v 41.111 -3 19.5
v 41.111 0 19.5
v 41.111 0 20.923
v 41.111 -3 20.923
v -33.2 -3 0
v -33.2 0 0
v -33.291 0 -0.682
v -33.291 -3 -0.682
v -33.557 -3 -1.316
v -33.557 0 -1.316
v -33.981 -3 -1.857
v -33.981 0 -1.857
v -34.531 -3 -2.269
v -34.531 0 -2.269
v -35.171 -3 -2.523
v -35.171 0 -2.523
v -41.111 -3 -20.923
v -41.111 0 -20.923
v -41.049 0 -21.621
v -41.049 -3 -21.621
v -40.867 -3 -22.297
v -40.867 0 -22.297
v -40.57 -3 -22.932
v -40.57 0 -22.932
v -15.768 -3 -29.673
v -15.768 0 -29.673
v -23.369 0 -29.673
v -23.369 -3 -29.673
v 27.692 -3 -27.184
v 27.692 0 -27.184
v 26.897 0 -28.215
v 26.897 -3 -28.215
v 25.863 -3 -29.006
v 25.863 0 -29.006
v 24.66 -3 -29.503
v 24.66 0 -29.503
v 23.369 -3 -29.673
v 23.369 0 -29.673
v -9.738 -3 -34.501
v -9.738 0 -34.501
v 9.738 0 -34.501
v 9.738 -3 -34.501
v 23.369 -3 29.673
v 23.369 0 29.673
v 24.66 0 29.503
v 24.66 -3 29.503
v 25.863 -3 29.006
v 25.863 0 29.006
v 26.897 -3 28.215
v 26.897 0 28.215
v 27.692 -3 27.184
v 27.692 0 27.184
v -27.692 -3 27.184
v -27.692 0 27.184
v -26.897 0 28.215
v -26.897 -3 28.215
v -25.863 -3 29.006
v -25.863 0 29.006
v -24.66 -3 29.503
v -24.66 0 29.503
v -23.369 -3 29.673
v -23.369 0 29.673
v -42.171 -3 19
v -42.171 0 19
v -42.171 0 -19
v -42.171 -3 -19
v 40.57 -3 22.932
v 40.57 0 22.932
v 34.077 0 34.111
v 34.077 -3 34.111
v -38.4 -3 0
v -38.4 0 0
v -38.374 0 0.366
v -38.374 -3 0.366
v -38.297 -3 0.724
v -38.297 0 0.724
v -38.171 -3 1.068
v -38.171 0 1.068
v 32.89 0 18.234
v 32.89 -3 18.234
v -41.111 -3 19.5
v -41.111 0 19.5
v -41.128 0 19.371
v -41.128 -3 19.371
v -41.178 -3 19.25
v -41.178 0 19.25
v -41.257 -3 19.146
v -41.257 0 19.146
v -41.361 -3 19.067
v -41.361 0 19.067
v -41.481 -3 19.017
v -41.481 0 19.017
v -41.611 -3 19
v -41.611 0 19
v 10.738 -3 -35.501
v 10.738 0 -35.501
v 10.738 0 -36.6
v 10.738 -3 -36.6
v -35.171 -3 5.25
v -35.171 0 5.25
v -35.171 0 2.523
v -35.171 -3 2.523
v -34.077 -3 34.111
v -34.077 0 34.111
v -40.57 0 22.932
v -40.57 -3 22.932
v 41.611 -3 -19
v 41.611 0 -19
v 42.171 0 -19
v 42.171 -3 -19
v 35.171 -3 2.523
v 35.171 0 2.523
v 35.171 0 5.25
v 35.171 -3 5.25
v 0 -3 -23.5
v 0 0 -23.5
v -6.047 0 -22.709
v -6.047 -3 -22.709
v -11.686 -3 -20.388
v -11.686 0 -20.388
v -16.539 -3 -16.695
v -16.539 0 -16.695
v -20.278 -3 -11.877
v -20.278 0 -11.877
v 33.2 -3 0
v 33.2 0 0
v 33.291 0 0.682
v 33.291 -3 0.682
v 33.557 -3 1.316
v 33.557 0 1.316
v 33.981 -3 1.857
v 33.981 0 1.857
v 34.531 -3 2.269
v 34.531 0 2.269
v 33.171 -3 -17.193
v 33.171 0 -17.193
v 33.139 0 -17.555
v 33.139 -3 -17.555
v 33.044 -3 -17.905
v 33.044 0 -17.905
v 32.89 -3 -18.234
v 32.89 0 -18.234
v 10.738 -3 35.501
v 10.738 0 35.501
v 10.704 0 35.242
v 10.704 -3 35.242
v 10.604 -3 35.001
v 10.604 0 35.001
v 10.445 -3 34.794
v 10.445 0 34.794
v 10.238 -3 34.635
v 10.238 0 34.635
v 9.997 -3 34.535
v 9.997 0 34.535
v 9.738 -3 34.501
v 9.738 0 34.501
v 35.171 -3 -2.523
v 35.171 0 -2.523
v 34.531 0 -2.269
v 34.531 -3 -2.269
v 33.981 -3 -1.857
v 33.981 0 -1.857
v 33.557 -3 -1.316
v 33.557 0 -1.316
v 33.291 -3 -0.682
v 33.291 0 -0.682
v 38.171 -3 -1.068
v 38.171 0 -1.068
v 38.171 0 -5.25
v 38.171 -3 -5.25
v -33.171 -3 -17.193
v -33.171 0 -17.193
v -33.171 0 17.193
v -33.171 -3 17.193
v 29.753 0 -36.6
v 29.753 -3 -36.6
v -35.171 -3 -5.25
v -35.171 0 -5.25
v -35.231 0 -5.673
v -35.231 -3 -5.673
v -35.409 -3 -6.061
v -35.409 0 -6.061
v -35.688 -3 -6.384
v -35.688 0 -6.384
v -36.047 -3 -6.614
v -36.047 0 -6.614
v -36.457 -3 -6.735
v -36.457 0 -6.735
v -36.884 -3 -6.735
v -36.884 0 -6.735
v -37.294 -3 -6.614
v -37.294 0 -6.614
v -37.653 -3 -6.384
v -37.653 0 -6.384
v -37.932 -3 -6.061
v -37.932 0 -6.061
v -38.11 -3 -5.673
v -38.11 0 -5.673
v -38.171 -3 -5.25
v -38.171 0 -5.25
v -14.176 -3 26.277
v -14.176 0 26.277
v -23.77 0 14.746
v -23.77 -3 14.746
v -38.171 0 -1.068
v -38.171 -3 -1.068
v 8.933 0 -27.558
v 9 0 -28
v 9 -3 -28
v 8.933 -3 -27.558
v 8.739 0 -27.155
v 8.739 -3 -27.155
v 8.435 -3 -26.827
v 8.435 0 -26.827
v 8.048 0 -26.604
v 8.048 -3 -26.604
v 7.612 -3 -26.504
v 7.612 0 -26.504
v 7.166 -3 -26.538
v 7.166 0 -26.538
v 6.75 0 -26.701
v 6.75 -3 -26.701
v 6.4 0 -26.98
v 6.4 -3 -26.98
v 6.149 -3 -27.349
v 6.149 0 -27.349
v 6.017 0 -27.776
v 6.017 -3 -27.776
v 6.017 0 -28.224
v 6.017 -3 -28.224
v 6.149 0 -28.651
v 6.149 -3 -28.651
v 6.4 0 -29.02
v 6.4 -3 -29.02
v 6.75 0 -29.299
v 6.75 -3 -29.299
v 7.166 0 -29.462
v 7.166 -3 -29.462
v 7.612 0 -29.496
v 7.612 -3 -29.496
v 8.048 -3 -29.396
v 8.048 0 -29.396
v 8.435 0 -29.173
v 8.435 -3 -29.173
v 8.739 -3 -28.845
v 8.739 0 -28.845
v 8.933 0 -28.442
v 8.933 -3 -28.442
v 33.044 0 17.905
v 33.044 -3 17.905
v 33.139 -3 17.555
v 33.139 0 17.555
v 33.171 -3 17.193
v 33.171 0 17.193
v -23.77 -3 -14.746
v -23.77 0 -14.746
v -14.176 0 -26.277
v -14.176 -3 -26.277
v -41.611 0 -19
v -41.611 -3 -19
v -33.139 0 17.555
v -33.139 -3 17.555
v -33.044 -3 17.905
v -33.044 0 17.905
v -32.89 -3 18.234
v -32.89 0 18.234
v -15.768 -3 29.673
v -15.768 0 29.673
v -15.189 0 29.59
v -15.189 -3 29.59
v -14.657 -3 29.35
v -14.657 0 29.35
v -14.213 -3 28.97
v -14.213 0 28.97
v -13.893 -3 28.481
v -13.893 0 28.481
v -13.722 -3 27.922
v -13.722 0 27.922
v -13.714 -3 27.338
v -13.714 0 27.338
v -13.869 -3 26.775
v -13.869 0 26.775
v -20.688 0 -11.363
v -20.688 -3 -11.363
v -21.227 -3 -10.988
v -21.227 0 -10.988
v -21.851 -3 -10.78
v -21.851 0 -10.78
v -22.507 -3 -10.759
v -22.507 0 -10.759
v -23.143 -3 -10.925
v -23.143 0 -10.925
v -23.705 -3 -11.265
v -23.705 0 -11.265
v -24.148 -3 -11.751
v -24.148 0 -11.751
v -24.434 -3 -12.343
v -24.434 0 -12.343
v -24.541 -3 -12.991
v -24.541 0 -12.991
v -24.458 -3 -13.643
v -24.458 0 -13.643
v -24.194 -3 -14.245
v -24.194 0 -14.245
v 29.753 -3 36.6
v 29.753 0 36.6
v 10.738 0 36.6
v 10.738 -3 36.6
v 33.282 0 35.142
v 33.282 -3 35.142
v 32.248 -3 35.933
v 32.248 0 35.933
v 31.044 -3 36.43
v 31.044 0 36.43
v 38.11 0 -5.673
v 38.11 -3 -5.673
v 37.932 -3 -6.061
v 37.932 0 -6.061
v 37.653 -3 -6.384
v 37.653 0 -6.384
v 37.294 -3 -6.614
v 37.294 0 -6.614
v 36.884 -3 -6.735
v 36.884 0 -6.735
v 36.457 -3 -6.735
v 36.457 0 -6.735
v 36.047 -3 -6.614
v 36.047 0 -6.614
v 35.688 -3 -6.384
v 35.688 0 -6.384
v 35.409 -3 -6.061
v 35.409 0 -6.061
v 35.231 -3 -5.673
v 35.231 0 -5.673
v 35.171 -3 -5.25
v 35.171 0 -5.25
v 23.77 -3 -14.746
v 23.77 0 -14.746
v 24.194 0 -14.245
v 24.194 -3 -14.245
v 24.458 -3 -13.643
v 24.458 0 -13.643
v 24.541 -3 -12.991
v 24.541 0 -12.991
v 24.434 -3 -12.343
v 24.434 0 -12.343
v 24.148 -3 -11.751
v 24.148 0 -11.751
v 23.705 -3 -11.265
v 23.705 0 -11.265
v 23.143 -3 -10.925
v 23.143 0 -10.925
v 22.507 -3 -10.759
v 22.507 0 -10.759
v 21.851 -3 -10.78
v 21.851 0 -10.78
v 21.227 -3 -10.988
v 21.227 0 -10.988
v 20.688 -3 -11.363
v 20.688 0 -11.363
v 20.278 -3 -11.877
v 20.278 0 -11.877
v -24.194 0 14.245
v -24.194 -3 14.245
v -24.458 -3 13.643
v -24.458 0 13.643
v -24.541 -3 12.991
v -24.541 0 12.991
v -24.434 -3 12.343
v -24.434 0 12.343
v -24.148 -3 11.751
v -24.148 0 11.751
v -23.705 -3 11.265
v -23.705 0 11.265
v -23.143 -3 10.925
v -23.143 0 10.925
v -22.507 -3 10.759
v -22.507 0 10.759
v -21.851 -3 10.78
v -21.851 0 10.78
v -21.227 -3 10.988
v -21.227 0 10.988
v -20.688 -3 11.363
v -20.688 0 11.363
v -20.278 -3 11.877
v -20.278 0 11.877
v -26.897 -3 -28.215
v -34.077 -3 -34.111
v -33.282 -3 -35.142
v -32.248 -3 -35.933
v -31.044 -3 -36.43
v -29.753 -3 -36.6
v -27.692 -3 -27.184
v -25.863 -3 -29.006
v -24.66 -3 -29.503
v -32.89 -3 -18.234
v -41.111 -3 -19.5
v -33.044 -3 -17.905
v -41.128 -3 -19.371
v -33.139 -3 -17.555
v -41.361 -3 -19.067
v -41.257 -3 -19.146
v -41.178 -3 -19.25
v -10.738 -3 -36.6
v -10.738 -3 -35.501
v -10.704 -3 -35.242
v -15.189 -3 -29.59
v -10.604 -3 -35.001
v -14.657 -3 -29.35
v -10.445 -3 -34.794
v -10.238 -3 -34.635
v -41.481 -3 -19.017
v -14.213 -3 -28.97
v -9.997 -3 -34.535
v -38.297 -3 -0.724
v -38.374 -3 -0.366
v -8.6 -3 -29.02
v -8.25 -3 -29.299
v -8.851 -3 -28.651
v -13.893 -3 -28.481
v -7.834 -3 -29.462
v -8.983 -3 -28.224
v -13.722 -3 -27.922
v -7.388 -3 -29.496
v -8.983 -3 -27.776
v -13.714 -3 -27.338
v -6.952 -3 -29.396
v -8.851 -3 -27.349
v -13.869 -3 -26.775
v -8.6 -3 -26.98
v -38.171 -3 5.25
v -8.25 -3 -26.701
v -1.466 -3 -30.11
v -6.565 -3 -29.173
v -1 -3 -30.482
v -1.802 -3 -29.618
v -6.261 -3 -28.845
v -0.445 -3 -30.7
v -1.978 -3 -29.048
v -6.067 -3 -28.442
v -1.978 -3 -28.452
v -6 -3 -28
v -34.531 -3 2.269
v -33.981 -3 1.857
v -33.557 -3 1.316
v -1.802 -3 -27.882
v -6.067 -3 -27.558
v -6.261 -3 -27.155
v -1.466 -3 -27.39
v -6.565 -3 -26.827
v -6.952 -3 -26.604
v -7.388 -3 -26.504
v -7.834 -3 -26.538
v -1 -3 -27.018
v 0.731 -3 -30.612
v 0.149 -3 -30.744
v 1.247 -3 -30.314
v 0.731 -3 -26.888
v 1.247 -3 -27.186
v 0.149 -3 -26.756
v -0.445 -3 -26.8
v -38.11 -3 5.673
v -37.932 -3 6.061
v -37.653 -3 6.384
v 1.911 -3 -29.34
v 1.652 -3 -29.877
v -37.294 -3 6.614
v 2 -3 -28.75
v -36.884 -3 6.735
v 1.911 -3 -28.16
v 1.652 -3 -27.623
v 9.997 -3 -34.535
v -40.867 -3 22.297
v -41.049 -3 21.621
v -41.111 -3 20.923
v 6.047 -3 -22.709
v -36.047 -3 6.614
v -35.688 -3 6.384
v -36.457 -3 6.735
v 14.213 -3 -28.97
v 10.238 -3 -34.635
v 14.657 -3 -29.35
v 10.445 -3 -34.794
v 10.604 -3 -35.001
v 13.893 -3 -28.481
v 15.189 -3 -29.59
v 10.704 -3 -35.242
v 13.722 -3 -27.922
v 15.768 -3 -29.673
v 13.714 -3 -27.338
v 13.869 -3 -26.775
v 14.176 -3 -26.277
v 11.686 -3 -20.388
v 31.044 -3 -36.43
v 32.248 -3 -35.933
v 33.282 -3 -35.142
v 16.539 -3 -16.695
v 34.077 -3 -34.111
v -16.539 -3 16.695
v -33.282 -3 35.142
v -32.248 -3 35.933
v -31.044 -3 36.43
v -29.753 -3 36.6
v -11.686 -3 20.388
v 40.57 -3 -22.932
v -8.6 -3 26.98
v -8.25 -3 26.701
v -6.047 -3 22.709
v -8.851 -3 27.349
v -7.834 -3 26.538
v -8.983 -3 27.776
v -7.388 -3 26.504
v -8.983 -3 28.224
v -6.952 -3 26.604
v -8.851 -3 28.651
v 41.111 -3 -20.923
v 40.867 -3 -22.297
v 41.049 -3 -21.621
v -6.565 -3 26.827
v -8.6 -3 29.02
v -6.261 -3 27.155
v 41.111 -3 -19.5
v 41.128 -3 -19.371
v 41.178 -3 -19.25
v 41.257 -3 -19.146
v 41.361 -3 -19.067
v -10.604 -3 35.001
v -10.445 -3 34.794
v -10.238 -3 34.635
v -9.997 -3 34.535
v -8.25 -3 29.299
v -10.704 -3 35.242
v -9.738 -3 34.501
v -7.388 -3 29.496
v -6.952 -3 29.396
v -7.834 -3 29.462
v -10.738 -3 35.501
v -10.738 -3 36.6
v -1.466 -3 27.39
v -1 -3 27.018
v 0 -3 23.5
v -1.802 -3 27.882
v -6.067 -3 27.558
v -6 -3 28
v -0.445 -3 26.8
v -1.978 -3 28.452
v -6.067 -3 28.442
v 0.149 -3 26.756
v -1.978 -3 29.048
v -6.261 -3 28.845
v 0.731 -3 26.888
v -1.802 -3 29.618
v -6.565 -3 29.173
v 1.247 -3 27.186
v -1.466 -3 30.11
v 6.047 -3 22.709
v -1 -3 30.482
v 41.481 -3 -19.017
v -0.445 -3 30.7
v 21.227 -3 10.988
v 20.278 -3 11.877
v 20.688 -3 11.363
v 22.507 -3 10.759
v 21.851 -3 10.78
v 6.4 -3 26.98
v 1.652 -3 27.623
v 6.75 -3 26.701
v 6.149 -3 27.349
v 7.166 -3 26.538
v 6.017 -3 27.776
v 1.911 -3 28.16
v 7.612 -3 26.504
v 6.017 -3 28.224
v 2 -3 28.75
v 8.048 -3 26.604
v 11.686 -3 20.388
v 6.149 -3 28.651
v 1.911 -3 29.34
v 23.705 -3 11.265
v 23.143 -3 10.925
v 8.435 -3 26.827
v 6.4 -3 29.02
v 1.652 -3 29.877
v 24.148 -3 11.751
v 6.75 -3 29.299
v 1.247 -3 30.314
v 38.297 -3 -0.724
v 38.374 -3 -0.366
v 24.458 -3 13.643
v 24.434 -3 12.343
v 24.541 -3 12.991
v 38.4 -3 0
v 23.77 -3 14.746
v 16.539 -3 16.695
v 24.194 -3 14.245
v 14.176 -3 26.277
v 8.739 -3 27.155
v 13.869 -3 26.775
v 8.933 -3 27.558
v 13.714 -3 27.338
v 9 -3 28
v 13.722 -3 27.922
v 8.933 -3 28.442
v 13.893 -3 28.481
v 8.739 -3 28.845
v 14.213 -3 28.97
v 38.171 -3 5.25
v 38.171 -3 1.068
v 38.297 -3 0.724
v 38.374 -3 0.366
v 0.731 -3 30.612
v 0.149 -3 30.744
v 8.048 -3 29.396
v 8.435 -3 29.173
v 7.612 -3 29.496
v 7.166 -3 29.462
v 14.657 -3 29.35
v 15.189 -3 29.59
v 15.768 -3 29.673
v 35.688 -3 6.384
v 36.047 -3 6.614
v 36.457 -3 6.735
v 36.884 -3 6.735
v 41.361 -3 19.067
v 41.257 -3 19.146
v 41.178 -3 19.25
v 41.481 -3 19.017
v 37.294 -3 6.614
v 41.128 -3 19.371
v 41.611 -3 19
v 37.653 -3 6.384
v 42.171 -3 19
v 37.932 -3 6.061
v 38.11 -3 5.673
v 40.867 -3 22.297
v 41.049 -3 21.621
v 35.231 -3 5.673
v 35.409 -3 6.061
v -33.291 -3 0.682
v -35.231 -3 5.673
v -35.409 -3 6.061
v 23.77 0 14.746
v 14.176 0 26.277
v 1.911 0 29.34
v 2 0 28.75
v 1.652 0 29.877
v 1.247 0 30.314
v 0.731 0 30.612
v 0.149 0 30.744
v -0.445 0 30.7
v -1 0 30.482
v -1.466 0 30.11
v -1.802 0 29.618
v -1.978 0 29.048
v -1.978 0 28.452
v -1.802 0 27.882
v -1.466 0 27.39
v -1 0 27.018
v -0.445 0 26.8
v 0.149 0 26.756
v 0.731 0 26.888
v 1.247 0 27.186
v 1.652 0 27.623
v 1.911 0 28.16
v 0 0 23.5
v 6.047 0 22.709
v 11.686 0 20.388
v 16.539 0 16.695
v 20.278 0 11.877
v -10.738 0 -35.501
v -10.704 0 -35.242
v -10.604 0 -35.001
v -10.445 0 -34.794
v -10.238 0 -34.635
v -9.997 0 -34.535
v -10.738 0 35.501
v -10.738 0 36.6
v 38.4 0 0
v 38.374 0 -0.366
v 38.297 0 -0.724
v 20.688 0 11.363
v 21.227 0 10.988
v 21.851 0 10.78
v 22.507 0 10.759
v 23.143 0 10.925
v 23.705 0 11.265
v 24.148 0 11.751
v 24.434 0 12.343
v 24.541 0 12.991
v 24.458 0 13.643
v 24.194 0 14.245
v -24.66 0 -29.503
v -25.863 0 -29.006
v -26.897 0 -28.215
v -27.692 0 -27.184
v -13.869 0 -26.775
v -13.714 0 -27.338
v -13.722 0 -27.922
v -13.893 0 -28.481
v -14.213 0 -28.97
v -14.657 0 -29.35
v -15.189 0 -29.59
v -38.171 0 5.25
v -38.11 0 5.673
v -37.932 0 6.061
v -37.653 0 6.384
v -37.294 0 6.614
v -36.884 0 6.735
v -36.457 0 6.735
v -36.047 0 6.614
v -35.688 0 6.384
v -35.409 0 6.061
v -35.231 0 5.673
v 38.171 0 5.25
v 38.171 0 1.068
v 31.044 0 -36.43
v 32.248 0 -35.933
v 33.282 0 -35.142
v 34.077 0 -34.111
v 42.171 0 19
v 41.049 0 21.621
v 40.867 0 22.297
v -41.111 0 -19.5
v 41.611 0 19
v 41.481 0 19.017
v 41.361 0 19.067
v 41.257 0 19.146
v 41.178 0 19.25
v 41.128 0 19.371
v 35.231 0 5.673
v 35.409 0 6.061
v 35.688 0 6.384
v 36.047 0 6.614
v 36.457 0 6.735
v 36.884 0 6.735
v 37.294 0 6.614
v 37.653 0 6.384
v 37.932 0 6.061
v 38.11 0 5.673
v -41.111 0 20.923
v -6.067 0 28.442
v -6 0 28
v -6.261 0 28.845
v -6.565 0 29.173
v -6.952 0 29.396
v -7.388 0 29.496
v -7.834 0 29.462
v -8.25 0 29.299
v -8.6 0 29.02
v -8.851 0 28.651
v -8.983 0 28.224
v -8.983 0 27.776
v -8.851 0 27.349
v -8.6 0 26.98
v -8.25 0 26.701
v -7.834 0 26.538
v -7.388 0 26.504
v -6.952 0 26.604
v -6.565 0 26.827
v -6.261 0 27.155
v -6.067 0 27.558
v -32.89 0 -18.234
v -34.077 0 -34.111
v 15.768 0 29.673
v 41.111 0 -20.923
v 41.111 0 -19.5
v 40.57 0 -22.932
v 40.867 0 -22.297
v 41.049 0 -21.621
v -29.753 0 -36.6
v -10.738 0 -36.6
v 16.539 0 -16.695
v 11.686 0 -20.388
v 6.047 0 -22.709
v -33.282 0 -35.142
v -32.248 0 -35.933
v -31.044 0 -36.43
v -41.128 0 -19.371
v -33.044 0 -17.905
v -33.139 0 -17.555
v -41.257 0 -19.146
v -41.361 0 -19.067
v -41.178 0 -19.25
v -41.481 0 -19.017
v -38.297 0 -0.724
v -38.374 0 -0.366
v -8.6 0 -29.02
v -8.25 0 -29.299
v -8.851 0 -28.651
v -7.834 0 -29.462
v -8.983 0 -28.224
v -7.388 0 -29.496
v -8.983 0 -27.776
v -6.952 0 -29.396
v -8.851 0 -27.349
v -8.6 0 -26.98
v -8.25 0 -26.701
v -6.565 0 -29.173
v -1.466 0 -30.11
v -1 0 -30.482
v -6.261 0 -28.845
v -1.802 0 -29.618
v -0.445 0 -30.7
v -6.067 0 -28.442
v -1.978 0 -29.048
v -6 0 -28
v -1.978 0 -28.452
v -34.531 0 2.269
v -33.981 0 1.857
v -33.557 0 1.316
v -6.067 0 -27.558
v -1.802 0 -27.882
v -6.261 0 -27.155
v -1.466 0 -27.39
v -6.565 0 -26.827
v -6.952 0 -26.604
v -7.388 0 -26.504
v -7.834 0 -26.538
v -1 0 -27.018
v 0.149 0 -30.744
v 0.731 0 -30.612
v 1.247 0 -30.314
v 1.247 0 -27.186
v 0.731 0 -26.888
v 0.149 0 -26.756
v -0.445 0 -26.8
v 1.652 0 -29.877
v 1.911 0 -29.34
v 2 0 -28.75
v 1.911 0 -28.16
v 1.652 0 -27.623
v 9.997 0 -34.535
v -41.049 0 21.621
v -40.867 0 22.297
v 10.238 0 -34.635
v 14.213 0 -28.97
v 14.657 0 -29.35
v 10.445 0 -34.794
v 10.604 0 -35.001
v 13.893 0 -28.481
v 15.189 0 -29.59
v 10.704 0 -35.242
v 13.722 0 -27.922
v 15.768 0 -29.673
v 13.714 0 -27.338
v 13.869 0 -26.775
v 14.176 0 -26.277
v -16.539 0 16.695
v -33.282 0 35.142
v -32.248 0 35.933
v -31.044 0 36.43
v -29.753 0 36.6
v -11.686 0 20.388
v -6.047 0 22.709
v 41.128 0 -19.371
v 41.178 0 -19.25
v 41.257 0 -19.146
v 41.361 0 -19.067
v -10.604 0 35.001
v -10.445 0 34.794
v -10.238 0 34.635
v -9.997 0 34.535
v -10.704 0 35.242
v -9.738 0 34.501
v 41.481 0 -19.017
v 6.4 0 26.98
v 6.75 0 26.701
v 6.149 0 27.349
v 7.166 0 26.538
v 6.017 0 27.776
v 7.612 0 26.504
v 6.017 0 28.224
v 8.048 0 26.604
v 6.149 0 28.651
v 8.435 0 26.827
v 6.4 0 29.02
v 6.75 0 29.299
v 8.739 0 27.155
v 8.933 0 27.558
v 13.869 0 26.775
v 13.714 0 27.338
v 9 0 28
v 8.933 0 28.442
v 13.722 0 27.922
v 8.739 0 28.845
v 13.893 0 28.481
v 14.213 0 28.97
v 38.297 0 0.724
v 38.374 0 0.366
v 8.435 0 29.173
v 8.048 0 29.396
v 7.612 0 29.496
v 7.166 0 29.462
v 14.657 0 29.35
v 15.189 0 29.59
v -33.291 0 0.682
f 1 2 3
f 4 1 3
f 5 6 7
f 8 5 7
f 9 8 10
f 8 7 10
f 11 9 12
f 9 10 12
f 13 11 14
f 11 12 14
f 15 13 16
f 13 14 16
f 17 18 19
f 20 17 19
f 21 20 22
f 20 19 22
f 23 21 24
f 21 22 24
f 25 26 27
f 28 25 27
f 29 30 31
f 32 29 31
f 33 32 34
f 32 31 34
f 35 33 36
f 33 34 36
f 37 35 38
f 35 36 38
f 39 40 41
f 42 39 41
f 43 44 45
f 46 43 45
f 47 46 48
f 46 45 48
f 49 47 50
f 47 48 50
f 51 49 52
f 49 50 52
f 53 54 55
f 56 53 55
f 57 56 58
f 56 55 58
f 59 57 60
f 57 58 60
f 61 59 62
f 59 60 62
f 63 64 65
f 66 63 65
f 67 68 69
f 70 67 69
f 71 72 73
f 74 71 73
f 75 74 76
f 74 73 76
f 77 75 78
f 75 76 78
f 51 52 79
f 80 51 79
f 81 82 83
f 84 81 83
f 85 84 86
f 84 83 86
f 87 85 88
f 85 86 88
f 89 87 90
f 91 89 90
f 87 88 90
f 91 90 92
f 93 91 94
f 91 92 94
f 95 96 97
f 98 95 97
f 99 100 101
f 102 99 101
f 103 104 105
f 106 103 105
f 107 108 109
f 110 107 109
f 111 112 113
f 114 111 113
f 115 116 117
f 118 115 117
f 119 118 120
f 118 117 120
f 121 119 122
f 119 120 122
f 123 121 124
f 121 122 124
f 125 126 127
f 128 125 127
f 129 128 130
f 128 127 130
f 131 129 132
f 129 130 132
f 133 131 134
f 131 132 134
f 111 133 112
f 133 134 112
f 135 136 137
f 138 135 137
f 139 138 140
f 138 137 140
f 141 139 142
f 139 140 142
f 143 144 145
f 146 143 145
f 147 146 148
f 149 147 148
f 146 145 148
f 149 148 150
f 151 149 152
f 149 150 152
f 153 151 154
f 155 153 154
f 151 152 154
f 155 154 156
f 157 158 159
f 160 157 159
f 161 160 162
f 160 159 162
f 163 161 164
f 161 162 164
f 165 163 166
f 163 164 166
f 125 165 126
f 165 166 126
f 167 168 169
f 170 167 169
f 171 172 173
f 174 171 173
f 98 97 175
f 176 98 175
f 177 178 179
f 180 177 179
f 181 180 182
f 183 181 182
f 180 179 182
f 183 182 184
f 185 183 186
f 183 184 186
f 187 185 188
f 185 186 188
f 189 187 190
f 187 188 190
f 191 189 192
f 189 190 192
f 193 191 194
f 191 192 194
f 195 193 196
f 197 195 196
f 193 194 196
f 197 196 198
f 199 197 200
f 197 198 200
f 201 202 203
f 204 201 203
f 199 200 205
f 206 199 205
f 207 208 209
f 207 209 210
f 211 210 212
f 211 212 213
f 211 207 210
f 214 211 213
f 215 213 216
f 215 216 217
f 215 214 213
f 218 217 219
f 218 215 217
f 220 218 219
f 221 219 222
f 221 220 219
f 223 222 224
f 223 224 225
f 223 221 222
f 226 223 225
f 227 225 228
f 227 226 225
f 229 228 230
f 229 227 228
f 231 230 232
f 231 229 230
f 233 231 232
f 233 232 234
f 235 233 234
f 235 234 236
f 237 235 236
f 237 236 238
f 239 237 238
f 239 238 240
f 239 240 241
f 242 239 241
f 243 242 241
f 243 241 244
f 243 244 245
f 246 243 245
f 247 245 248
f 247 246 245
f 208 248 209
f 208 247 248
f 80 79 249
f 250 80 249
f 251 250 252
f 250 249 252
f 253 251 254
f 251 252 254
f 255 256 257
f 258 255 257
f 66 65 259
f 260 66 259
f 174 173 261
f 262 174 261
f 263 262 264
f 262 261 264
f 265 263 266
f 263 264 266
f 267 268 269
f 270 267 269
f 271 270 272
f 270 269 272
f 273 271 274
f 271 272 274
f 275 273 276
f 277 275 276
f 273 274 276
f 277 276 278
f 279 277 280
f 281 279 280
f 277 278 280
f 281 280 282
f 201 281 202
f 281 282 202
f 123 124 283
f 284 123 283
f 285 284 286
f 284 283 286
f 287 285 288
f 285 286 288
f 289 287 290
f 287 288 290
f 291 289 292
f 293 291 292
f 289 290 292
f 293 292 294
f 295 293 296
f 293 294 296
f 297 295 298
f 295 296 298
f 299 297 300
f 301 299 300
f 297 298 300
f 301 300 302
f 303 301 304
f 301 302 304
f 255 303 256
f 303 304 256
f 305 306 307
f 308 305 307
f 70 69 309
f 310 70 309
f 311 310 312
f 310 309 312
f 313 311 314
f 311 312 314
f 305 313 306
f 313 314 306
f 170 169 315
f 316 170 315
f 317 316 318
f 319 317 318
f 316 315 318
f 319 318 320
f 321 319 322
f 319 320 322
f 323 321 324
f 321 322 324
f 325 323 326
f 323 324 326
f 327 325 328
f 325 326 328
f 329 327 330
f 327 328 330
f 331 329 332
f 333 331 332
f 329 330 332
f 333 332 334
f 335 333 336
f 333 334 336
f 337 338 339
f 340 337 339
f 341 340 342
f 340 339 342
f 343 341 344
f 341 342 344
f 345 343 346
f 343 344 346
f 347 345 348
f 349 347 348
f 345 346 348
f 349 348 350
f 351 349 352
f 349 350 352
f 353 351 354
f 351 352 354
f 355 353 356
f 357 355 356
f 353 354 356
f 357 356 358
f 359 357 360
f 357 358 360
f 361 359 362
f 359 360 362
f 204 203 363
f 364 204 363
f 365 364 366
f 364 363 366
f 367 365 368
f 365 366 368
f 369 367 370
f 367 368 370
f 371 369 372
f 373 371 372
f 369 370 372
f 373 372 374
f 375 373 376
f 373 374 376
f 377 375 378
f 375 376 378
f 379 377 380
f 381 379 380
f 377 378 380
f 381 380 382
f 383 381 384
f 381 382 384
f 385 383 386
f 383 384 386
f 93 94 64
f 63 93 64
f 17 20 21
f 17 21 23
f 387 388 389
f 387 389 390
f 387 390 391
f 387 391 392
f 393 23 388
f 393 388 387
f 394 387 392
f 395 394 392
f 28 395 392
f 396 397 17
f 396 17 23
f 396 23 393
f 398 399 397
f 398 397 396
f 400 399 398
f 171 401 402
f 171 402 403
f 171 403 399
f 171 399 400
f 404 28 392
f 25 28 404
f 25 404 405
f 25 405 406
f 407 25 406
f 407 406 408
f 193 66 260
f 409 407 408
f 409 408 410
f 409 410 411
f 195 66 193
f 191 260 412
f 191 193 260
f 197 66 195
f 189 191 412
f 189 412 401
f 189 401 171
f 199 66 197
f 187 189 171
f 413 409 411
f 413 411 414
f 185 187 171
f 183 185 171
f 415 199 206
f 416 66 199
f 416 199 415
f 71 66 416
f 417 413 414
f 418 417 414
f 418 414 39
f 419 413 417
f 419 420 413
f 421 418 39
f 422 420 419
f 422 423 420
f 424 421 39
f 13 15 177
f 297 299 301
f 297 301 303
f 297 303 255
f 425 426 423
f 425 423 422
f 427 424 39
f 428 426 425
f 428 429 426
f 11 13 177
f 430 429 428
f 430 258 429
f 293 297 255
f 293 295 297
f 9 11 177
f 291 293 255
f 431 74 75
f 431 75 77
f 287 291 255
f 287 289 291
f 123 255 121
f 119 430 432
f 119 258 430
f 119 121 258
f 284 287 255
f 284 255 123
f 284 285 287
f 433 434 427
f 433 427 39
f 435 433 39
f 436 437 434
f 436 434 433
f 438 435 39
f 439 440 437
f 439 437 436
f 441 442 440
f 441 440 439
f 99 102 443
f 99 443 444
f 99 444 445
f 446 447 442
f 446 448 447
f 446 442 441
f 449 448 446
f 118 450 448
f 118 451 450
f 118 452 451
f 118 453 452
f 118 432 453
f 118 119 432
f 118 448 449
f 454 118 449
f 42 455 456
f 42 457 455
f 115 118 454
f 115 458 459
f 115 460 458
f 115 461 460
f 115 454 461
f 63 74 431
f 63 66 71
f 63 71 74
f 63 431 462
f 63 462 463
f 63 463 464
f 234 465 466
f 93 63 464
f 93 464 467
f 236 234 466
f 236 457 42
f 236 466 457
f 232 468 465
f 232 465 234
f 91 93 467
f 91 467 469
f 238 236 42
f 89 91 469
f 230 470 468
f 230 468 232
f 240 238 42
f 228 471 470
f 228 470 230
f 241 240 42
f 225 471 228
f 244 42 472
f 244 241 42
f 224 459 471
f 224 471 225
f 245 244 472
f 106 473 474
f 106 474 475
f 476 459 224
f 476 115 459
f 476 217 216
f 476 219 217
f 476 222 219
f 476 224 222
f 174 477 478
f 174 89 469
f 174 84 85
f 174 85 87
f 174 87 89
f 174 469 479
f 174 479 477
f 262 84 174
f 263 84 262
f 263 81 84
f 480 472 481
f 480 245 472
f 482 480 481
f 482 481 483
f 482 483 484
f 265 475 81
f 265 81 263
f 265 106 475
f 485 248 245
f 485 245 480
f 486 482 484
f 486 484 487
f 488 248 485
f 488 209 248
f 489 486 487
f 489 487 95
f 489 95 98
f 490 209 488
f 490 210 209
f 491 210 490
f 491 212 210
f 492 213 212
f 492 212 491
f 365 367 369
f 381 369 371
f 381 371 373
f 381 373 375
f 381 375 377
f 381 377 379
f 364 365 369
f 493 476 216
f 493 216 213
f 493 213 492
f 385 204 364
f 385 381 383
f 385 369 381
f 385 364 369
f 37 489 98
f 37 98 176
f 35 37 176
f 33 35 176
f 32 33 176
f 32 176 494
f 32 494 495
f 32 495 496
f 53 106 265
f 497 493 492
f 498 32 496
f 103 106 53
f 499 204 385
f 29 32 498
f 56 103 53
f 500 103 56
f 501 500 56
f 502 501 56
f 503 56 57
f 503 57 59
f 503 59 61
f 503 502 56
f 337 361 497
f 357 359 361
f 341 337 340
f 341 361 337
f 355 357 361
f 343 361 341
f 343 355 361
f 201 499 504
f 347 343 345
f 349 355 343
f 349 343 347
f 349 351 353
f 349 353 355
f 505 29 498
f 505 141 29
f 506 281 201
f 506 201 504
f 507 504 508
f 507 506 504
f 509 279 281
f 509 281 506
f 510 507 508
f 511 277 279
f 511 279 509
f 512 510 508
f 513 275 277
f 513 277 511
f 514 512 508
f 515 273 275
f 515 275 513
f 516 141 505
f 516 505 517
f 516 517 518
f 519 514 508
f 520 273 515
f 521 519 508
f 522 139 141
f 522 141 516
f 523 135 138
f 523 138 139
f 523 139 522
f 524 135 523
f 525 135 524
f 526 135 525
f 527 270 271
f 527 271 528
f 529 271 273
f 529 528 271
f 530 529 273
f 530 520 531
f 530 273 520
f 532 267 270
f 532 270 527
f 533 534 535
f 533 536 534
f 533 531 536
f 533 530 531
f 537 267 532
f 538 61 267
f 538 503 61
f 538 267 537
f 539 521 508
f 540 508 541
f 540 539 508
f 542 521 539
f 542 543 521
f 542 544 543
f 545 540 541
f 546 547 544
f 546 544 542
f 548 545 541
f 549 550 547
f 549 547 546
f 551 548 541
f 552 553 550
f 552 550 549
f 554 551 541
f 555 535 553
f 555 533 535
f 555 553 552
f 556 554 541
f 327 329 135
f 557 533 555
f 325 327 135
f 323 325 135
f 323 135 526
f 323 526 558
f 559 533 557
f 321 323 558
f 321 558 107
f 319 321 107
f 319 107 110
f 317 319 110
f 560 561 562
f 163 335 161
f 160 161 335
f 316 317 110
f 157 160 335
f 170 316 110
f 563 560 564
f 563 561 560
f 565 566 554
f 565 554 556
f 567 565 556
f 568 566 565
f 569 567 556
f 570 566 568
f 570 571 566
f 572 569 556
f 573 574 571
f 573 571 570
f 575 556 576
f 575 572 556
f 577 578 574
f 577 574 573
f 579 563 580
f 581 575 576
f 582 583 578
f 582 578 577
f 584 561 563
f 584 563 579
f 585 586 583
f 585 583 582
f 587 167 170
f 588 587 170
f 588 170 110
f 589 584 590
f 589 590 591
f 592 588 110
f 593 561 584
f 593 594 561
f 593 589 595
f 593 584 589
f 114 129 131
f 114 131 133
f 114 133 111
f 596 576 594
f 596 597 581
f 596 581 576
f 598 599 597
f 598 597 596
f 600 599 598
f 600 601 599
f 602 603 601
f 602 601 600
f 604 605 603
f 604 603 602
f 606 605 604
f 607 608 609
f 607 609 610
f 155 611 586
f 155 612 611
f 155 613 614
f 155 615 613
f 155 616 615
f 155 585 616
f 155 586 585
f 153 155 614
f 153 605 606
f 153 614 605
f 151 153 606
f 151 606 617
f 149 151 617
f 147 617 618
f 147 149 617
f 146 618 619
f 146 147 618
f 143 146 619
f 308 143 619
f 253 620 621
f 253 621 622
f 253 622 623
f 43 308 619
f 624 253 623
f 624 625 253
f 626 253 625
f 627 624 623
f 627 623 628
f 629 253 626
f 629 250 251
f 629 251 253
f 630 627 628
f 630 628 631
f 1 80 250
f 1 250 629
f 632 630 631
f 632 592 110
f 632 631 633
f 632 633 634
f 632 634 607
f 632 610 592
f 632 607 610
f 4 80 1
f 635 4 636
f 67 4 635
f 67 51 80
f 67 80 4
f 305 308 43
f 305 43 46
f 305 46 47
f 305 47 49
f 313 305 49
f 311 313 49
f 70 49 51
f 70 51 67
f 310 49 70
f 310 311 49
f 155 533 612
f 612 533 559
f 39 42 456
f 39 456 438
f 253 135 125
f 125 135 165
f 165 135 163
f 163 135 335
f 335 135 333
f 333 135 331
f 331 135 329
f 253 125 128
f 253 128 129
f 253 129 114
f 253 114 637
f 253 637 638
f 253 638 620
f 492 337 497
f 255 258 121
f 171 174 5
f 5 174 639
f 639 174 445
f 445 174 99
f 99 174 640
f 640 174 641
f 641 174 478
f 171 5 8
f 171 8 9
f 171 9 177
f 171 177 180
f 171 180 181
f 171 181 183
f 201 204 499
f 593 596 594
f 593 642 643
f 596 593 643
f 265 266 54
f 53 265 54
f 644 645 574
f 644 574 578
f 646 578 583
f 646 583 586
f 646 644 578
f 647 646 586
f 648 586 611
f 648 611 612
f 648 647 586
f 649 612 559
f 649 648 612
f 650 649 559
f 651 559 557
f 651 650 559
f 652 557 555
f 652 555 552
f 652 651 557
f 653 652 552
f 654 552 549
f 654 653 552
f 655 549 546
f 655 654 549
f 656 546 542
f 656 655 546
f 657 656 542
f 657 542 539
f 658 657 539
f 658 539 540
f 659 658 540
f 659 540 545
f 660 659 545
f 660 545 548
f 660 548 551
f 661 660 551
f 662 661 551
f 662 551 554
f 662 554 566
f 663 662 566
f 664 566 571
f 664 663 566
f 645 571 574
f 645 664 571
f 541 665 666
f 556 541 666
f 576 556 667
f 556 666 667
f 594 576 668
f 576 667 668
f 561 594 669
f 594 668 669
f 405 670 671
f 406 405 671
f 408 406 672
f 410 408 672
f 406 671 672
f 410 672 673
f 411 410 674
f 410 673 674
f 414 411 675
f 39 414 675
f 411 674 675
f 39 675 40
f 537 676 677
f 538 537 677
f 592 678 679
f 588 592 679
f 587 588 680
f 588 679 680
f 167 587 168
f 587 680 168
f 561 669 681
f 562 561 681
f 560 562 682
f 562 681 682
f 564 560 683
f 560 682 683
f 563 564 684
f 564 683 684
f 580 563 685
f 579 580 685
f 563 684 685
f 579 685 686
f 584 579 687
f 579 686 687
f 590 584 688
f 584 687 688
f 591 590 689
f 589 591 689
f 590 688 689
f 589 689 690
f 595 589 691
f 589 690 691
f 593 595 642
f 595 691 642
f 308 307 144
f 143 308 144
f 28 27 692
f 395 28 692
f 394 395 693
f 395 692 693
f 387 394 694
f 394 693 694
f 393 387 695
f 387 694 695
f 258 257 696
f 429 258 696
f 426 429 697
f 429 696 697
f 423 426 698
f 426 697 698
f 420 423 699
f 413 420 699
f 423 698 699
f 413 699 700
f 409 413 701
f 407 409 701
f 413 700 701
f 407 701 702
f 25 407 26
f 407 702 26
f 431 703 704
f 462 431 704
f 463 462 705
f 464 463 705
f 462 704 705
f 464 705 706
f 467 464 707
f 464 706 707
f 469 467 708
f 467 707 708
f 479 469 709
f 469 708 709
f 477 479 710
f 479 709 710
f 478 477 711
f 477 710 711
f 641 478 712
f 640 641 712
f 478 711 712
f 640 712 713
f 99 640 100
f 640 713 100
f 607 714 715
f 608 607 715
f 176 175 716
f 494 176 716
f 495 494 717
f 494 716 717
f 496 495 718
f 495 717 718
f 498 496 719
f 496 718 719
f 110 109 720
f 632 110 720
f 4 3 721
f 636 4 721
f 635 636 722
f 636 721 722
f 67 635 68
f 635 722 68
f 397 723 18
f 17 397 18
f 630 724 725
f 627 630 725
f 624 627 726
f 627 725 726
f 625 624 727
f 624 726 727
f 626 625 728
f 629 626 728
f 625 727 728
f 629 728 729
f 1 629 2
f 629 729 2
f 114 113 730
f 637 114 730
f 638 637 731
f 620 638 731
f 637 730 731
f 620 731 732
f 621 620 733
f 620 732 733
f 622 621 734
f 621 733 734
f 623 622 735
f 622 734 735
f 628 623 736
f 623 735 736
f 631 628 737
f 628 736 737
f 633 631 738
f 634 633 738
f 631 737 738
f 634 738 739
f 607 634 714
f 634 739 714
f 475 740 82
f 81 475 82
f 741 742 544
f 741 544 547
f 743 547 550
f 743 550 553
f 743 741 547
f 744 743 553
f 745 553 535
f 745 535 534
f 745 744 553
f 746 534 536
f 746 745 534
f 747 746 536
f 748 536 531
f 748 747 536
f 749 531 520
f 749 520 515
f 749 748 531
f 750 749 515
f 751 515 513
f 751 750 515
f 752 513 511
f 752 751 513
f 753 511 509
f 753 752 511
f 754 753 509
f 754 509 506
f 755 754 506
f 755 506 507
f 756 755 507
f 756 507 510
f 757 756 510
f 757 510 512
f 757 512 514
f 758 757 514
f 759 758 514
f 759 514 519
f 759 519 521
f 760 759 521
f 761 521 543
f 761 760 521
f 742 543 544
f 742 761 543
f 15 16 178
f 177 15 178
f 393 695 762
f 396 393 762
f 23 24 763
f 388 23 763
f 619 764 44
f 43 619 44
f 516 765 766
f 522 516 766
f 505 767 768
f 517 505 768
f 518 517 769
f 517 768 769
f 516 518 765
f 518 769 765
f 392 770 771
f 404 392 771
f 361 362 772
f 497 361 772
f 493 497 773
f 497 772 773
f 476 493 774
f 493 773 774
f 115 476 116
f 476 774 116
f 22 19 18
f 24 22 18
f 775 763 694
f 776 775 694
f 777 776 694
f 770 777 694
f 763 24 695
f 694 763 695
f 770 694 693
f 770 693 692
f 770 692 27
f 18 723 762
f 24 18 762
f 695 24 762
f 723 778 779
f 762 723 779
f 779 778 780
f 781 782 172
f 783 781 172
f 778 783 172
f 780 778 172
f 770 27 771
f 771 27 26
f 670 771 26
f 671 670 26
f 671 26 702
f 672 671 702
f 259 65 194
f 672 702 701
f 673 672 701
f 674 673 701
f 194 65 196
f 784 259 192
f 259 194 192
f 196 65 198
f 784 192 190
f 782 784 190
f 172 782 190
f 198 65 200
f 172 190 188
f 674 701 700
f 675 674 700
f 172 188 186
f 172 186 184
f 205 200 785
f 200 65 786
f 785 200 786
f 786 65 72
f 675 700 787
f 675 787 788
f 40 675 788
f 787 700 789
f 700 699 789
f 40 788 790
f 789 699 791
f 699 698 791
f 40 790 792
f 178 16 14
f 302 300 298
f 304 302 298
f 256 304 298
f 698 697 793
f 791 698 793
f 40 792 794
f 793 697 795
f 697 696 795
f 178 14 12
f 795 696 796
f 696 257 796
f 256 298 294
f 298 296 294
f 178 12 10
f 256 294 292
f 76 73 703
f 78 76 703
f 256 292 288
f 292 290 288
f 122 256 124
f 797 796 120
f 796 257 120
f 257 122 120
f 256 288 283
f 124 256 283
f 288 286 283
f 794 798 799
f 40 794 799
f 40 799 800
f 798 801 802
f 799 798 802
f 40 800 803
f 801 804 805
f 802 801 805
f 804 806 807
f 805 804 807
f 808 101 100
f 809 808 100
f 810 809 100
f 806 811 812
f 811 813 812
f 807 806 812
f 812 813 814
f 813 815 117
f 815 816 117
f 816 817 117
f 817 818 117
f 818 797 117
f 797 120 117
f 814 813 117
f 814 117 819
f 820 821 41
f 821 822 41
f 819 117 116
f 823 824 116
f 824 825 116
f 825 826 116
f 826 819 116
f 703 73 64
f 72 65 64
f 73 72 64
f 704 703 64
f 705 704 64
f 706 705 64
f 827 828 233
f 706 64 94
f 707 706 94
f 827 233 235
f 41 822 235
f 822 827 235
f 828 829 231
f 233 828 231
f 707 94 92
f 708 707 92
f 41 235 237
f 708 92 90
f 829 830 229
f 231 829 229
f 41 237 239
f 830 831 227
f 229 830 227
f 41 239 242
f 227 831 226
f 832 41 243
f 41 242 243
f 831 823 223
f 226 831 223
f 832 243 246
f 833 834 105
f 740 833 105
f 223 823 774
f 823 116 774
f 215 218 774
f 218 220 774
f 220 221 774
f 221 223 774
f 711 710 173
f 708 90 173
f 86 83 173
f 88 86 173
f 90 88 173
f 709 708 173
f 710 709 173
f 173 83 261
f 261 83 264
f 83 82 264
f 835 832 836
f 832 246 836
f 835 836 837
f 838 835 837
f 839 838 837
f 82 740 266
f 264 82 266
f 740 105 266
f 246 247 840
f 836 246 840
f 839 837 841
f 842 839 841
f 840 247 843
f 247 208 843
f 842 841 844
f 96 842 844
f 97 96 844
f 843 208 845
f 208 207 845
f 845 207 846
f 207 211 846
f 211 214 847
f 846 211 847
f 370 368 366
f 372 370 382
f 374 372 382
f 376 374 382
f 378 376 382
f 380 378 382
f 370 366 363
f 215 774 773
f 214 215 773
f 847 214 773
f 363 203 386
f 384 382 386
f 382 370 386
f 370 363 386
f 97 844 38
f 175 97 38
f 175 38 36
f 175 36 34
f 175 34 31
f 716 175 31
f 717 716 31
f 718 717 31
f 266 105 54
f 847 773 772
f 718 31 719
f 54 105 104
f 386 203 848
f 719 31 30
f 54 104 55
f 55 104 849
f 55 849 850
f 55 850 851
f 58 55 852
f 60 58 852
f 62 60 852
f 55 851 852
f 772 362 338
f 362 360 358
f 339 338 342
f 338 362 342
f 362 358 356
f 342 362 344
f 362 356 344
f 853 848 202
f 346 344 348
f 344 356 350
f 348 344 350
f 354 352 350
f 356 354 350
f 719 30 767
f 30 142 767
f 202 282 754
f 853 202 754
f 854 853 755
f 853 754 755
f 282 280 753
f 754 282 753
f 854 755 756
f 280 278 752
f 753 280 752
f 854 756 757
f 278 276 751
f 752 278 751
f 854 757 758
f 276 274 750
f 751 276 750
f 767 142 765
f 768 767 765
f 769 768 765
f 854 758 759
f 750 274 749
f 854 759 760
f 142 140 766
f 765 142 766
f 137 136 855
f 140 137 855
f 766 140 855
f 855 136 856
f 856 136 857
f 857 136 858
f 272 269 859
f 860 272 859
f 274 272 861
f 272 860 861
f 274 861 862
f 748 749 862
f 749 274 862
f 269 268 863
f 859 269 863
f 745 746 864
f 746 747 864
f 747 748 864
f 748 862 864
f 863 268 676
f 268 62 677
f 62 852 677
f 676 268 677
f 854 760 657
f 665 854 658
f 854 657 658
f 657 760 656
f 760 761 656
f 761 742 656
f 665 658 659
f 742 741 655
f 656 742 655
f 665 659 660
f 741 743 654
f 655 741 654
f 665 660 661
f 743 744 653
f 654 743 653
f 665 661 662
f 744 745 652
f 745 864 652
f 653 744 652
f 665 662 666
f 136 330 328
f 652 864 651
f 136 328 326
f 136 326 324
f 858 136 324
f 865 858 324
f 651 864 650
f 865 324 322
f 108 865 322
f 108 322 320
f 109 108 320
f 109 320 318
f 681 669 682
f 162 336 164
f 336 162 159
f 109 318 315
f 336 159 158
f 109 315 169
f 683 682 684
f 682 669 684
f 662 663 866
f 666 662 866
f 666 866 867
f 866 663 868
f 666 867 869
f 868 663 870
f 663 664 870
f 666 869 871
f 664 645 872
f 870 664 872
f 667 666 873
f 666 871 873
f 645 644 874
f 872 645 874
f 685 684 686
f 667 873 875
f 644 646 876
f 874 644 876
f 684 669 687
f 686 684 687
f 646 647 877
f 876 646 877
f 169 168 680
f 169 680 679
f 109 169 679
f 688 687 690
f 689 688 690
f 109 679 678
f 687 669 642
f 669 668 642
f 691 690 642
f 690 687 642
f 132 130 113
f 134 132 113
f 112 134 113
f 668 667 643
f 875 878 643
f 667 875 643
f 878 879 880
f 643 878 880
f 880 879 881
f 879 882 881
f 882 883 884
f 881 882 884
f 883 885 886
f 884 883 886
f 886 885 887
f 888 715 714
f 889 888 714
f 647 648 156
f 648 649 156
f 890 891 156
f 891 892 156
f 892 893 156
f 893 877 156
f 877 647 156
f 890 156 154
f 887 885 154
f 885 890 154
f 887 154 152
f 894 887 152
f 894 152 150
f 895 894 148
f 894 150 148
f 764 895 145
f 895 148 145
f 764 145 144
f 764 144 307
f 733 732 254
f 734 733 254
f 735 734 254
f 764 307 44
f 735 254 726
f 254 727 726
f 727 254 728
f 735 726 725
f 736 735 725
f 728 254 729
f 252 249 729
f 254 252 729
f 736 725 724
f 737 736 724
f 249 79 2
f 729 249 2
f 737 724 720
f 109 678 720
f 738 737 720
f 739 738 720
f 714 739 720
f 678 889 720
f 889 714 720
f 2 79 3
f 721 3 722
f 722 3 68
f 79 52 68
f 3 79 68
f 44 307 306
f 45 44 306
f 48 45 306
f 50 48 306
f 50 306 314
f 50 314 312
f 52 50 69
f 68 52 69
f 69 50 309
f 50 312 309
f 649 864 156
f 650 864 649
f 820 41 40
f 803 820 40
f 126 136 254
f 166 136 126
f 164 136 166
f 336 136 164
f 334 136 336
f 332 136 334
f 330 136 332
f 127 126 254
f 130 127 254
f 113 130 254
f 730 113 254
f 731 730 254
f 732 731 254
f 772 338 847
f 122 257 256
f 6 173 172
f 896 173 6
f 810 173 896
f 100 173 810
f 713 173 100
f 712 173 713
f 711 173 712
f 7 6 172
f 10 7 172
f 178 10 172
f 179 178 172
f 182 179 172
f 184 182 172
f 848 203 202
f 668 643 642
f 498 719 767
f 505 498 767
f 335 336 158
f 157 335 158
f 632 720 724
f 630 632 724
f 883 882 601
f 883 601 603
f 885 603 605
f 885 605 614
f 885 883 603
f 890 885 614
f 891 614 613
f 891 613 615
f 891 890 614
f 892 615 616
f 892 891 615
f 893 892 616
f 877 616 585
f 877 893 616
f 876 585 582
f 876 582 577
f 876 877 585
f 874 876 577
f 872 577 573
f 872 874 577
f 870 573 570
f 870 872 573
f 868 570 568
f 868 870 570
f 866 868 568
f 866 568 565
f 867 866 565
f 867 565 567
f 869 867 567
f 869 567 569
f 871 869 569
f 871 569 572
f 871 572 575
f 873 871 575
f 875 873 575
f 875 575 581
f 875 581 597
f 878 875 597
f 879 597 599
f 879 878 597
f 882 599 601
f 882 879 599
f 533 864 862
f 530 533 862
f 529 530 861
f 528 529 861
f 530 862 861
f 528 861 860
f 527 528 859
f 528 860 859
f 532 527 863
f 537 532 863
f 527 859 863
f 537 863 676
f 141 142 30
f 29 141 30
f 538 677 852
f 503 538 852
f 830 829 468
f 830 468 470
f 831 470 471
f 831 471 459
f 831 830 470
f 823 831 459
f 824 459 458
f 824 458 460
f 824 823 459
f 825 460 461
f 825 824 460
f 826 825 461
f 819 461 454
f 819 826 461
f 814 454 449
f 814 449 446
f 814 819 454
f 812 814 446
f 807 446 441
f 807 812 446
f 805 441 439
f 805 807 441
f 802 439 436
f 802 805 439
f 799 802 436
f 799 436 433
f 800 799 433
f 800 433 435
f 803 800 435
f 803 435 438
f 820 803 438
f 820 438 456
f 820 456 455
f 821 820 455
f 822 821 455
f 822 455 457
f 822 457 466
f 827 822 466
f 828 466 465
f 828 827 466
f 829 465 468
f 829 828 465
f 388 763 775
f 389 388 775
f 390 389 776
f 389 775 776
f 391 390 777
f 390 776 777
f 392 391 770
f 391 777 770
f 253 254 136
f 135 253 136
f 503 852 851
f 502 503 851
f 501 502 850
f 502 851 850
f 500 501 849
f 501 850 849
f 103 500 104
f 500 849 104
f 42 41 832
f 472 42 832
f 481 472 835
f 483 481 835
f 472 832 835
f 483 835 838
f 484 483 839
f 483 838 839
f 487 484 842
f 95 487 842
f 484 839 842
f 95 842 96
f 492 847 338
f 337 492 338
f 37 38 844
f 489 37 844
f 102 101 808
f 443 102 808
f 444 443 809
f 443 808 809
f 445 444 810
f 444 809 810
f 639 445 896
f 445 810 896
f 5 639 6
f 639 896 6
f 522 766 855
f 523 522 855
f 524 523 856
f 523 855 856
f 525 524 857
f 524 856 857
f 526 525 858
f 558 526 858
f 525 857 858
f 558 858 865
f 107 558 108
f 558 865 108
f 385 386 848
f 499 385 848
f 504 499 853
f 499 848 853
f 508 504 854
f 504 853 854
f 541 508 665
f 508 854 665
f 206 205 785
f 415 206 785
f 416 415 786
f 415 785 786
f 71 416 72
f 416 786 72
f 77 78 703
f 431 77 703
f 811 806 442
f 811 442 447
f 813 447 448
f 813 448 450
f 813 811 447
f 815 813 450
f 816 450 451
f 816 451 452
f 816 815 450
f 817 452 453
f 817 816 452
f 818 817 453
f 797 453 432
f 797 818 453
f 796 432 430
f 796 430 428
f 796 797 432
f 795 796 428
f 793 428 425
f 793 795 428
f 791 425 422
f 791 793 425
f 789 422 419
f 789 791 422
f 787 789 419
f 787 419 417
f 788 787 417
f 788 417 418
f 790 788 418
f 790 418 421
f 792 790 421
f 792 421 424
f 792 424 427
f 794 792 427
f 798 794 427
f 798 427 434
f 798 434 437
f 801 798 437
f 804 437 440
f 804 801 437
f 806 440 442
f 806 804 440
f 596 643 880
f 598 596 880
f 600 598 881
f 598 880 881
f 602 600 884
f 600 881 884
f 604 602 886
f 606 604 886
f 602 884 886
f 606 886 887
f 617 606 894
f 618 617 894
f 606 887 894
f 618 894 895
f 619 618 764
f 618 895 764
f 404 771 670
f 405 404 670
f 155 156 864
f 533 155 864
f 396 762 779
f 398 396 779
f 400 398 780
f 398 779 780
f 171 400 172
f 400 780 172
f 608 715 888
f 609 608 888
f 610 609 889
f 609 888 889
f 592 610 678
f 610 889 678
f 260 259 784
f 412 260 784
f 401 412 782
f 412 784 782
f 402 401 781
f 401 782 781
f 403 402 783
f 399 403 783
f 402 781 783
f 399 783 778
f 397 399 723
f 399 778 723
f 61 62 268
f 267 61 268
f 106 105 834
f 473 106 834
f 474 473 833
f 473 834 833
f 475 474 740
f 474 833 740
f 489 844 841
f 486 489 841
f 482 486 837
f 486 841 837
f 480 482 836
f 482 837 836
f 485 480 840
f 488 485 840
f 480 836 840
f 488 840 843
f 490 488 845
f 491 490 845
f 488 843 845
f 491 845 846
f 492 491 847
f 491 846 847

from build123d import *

# Parameters (mm, degrees)
F0_R     = 1.5
F0_R_2   = 2
F1_DEPTH = 3


with BuildPart() as f1:
    # F0 (on Front) → F1 (new body)
    with BuildSketch(Plane.XZ):
        with BuildLine():
            Line((41.110818, 19.5), (41.110818, 20.922697))
            ThreePointArc((41.110818, 20.922697), (40.973189, 21.962933), (40.569773, 22.931585))
            Line((40.569773, 22.931585), (34.076942, 34.11111))
            ThreePointArc((34.076942, 34.11111), (32.247687, 35.933333), (29.753248, 36.6))
            Line((29.753248, 36.6), (10.738378, 36.6))
            Line((10.738378, 36.6), (10.738378, 35.500753))
            ThreePointArc((10.738378, 35.500753), (10.445485, 34.793646), (9.738378, 34.500753))
            Line((9.738378, 34.500753), (0, 34.500753))
            Line((0, 34.500753), (-9.738378, 34.500753))
            ThreePointArc((-9.738378, 34.500753), (-10.445485, 34.793646), (-10.738378, 35.500753))
            Line((-10.738378, 35.500753), (-10.738378, 36.6))
            Line((-10.738378, 36.6), (-29.753248, 36.6))
            ThreePointArc((-29.753248, 36.6), (-32.247687, 35.933333), (-34.076942, 34.11111))
            Line((-34.076942, 34.11111), (-40.569773, 22.931585))
            ThreePointArc((-40.569773, 22.931585), (-40.973189, 21.962933), (-41.110818, 20.922697))
            Line((-41.110818, 20.922697), (-41.110818, 19.5))
            ThreePointArc((-41.110818, 19.5), (-41.257265, 19.146447), (-41.610818, 19))
            Line((-41.610818, 19), (-42.170605, 19))
            Line((-42.170605, 19), (-42.170605, 0))
            Line((-42.170605, 0), (-42.170605, -19))
            Line((-42.170605, -19), (-41.610818, -19))
            ThreePointArc((-41.610818, -19), (-41.257265, -19.146447), (-41.110818, -19.5))
            Line((-41.110818, -19.5), (-41.110818, -20.922697))
            ThreePointArc((-41.110818, -20.922697), (-40.973189, -21.962933), (-40.569773, -22.931585))
            Line((-40.569773, -22.931585), (-34.076942, -34.11111))
            ThreePointArc((-34.076942, -34.11111), (-32.247687, -35.933333), (-29.753248, -36.6))
            Line((-29.753248, -36.6), (-10.738378, -36.6))
            Line((-10.738378, -36.6), (-10.738378, -35.500753))
            ThreePointArc((-10.738378, -35.500753), (-10.445485, -34.793646), (-9.738378, -34.500753))
            Line((-9.738378, -34.500753), (0, -34.500753))
            Line((0, -34.500753), (9.738378, -34.500753))
            ThreePointArc((9.738378, -34.500753), (10.445485, -34.793646), (10.738378, -35.500753))
            Line((10.738378, -35.500753), (10.738378, -36.6))
            Line((10.738378, -36.6), (29.753248, -36.6))
            ThreePointArc((29.753248, -36.6), (32.247687, -35.933333), (34.076942, -34.11111))
            Line((34.076942, -34.11111), (40.569773, -22.931585))
            ThreePointArc((40.569773, -22.931585), (40.973189, -21.962933), (41.110818, -20.922697))
            Line((41.110818, -20.922697), (41.110818, -19.5))
            ThreePointArc((41.110818, -19.5), (41.257265, -19.146447), (41.610818, -19))
            Line((41.610818, -19), (42.170605, -19))
            Line((42.170605, -19), (42.170605, 0))
            Line((42.170605, 0), (42.170605, 19))
            Line((42.170605, 19), (41.610818, 19))
            ThreePointArc((41.610818, 19), (41.257265, 19.146447), (41.110818, 19.5))
        make_face()
        with Locations((-7.5, -28)):
            Circle(F0_R, mode=Mode.SUBTRACT)
        with Locations((0, -28.75)):
            Circle(F0_R_2, mode=Mode.SUBTRACT)
        with Locations((7.5, -28)):
            Circle(F0_R, mode=Mode.SUBTRACT)
        with BuildLine():
            ThreePointArc((-35.170605, 2.52267), (-33.751046, 1.600558), (-33.2, 0))
            ThreePointArc((-33.2, 0), (-33.751046, -1.600558), (-35.170605, -2.52267))
            Line((-35.170605, -2.52267), (-35.170605, -5.25))
            ThreePointArc((-35.170605, -5.25), (-36.670605, -6.75), (-38.170605, -5.25))
            Line((-38.170605, -5.25), (-38.170605, -1.067816))
            ThreePointArc((-38.170605, -1.067816), (-38.342004, -0.546089), (-38.4, 0))
            ThreePointArc((-38.4, 0), (-38.342004, 0.546089), (-38.170605, 1.067816))
            Line((-38.170605, 1.067816), (-38.170605, 5.25))
            ThreePointArc((-38.170605, 5.25), (-36.670605, 6.75), (-35.170605, 5.25))
            Line((-35.170605, 5.25), (-35.170605, 2.52267))
        make_face(mode=Mode.SUBTRACT)
        with Locations((-7.5, 28)):
            Circle(F0_R, mode=Mode.SUBTRACT)
        with BuildLine():
            ThreePointArc((23.368655, 29.672794), (25.863094, 29.006127), (27.692349, 27.183904))
            Line((27.692349, 27.183904), (32.890436, 18.233704))
            ThreePointArc((32.890436, 18.233704), (33.099337, 17.732107), (33.170605, 17.193441))
            Line((33.170605, 17.193441), (33.170605, 0))
            Line((33.170605, 0), (33.170605, -17.193441))
            ThreePointArc((33.170605, -17.193441), (33.099337, -17.732107), (32.890436, -18.233704))
            Line((32.890436, -18.233704), (27.692349, -27.183904))
            ThreePointArc((27.692349, -27.183904), (25.863094, -29.006127), (23.368655, -29.672794))
            Line((23.368655, -29.672794), (15.767856, -29.672794))
            ThreePointArc((15.767856, -29.672794), (13.892719, -28.480943), (14.175847, -26.2772))
            Line((14.175847, -26.2772), (23.769717, -14.746473))
            ThreePointArc((23.769717, -14.746473), (23.705468, -11.265364), (20.277872, -11.876781))
            ThreePointArc((20.277872, -11.876781), (11.686438, -20.388163), (0, -23.5))
            ThreePointArc((0, -23.5), (-11.686438, -20.388163), (-20.277872, -11.876781))
            ThreePointArc((-20.277872, -11.876781), (-23.705468, -11.265364), (-23.769717, -14.746473))
            Line((-23.769717, -14.746473), (-14.175847, -26.2772))
            ThreePointArc((-14.175847, -26.2772), (-13.892719, -28.480943), (-15.767856, -29.672794))
            Line((-15.767856, -29.672794), (-23.368655, -29.672794))
            ThreePointArc((-23.368655, -29.672794), (-25.863094, -29.006127), (-27.692349, -27.183904))
            Line((-27.692349, -27.183904), (-32.890436, -18.233704))
            ThreePointArc((-32.890436, -18.233704), (-33.099337, -17.732107), (-33.170605, -17.193441))
            Line((-33.170605, -17.193441), (-33.170605, 0))
            Line((-33.170605, 0), (-33.170605, 17.193441))
            ThreePointArc((-33.170605, 17.193441), (-33.099337, 17.732107), (-32.890436, 18.233704))
            Line((-32.890436, 18.233704), (-27.692349, 27.183904))
            ThreePointArc((-27.692349, 27.183904), (-25.863094, 29.006127), (-23.368655, 29.672794))
            Line((-23.368655, 29.672794), (-15.767856, 29.672794))
            ThreePointArc((-15.767856, 29.672794), (-13.892719, 28.480943), (-14.175847, 26.2772))
            Line((-14.175847, 26.2772), (-23.769717, 14.746473))
            ThreePointArc((-23.769717, 14.746473), (-23.705468, 11.265364), (-20.277872, 11.876781))
            ThreePointArc((-20.277872, 11.876781), (-11.686438, 20.388163), (0, 23.5))
            ThreePointArc((0, 23.5), (11.686438, 20.388163), (20.277872, 11.876781))
            ThreePointArc((20.277872, 11.876781), (23.705468, 11.265364), (23.769717, 14.746473))
            Line((23.769717, 14.746473), (14.175847, 26.2772))
            ThreePointArc((14.175847, 26.2772), (13.892719, 28.480943), (15.767856, 29.672794))
            Line((15.767856, 29.672794), (23.368655, 29.672794))
        make_face(mode=Mode.SUBTRACT)
        with BuildLine():
            ThreePointArc((35.170605, -2.52267), (33.751046, -1.600558), (33.2, 0))
            ThreePointArc((33.2, 0), (33.751046, 1.600558), (35.170605, 2.52267))
            Line((35.170605, 2.52267), (35.170605, 5.25))
            ThreePointArc((35.170605, 5.25), (36.670605, 6.75), (38.170605, 5.25))
            Line((38.170605, 5.25), (38.170605, 1.067816))
            ThreePointArc((38.170605, 1.067816), (38.342004, 0.546089), (38.4, 0))
            ThreePointArc((38.4, 0), (38.342004, -0.546089), (38.170605, -1.067816))
            Line((38.170605, -1.067816), (38.170605, -5.25))
            ThreePointArc((38.170605, -5.25), (36.670605, -6.75), (35.170605, -5.25))
            Line((35.170605, -5.25), (35.170605, -2.52267))
        make_face(mode=Mode.SUBTRACT)
        with Locations((0, 28.75)):
            Circle(F0_R_2, mode=Mode.SUBTRACT)
        with Locations((7.5, 28)):
            Circle(F0_R, mode=Mode.SUBTRACT)
    extrude(amount=F1_DEPTH)


solid = f1.part
